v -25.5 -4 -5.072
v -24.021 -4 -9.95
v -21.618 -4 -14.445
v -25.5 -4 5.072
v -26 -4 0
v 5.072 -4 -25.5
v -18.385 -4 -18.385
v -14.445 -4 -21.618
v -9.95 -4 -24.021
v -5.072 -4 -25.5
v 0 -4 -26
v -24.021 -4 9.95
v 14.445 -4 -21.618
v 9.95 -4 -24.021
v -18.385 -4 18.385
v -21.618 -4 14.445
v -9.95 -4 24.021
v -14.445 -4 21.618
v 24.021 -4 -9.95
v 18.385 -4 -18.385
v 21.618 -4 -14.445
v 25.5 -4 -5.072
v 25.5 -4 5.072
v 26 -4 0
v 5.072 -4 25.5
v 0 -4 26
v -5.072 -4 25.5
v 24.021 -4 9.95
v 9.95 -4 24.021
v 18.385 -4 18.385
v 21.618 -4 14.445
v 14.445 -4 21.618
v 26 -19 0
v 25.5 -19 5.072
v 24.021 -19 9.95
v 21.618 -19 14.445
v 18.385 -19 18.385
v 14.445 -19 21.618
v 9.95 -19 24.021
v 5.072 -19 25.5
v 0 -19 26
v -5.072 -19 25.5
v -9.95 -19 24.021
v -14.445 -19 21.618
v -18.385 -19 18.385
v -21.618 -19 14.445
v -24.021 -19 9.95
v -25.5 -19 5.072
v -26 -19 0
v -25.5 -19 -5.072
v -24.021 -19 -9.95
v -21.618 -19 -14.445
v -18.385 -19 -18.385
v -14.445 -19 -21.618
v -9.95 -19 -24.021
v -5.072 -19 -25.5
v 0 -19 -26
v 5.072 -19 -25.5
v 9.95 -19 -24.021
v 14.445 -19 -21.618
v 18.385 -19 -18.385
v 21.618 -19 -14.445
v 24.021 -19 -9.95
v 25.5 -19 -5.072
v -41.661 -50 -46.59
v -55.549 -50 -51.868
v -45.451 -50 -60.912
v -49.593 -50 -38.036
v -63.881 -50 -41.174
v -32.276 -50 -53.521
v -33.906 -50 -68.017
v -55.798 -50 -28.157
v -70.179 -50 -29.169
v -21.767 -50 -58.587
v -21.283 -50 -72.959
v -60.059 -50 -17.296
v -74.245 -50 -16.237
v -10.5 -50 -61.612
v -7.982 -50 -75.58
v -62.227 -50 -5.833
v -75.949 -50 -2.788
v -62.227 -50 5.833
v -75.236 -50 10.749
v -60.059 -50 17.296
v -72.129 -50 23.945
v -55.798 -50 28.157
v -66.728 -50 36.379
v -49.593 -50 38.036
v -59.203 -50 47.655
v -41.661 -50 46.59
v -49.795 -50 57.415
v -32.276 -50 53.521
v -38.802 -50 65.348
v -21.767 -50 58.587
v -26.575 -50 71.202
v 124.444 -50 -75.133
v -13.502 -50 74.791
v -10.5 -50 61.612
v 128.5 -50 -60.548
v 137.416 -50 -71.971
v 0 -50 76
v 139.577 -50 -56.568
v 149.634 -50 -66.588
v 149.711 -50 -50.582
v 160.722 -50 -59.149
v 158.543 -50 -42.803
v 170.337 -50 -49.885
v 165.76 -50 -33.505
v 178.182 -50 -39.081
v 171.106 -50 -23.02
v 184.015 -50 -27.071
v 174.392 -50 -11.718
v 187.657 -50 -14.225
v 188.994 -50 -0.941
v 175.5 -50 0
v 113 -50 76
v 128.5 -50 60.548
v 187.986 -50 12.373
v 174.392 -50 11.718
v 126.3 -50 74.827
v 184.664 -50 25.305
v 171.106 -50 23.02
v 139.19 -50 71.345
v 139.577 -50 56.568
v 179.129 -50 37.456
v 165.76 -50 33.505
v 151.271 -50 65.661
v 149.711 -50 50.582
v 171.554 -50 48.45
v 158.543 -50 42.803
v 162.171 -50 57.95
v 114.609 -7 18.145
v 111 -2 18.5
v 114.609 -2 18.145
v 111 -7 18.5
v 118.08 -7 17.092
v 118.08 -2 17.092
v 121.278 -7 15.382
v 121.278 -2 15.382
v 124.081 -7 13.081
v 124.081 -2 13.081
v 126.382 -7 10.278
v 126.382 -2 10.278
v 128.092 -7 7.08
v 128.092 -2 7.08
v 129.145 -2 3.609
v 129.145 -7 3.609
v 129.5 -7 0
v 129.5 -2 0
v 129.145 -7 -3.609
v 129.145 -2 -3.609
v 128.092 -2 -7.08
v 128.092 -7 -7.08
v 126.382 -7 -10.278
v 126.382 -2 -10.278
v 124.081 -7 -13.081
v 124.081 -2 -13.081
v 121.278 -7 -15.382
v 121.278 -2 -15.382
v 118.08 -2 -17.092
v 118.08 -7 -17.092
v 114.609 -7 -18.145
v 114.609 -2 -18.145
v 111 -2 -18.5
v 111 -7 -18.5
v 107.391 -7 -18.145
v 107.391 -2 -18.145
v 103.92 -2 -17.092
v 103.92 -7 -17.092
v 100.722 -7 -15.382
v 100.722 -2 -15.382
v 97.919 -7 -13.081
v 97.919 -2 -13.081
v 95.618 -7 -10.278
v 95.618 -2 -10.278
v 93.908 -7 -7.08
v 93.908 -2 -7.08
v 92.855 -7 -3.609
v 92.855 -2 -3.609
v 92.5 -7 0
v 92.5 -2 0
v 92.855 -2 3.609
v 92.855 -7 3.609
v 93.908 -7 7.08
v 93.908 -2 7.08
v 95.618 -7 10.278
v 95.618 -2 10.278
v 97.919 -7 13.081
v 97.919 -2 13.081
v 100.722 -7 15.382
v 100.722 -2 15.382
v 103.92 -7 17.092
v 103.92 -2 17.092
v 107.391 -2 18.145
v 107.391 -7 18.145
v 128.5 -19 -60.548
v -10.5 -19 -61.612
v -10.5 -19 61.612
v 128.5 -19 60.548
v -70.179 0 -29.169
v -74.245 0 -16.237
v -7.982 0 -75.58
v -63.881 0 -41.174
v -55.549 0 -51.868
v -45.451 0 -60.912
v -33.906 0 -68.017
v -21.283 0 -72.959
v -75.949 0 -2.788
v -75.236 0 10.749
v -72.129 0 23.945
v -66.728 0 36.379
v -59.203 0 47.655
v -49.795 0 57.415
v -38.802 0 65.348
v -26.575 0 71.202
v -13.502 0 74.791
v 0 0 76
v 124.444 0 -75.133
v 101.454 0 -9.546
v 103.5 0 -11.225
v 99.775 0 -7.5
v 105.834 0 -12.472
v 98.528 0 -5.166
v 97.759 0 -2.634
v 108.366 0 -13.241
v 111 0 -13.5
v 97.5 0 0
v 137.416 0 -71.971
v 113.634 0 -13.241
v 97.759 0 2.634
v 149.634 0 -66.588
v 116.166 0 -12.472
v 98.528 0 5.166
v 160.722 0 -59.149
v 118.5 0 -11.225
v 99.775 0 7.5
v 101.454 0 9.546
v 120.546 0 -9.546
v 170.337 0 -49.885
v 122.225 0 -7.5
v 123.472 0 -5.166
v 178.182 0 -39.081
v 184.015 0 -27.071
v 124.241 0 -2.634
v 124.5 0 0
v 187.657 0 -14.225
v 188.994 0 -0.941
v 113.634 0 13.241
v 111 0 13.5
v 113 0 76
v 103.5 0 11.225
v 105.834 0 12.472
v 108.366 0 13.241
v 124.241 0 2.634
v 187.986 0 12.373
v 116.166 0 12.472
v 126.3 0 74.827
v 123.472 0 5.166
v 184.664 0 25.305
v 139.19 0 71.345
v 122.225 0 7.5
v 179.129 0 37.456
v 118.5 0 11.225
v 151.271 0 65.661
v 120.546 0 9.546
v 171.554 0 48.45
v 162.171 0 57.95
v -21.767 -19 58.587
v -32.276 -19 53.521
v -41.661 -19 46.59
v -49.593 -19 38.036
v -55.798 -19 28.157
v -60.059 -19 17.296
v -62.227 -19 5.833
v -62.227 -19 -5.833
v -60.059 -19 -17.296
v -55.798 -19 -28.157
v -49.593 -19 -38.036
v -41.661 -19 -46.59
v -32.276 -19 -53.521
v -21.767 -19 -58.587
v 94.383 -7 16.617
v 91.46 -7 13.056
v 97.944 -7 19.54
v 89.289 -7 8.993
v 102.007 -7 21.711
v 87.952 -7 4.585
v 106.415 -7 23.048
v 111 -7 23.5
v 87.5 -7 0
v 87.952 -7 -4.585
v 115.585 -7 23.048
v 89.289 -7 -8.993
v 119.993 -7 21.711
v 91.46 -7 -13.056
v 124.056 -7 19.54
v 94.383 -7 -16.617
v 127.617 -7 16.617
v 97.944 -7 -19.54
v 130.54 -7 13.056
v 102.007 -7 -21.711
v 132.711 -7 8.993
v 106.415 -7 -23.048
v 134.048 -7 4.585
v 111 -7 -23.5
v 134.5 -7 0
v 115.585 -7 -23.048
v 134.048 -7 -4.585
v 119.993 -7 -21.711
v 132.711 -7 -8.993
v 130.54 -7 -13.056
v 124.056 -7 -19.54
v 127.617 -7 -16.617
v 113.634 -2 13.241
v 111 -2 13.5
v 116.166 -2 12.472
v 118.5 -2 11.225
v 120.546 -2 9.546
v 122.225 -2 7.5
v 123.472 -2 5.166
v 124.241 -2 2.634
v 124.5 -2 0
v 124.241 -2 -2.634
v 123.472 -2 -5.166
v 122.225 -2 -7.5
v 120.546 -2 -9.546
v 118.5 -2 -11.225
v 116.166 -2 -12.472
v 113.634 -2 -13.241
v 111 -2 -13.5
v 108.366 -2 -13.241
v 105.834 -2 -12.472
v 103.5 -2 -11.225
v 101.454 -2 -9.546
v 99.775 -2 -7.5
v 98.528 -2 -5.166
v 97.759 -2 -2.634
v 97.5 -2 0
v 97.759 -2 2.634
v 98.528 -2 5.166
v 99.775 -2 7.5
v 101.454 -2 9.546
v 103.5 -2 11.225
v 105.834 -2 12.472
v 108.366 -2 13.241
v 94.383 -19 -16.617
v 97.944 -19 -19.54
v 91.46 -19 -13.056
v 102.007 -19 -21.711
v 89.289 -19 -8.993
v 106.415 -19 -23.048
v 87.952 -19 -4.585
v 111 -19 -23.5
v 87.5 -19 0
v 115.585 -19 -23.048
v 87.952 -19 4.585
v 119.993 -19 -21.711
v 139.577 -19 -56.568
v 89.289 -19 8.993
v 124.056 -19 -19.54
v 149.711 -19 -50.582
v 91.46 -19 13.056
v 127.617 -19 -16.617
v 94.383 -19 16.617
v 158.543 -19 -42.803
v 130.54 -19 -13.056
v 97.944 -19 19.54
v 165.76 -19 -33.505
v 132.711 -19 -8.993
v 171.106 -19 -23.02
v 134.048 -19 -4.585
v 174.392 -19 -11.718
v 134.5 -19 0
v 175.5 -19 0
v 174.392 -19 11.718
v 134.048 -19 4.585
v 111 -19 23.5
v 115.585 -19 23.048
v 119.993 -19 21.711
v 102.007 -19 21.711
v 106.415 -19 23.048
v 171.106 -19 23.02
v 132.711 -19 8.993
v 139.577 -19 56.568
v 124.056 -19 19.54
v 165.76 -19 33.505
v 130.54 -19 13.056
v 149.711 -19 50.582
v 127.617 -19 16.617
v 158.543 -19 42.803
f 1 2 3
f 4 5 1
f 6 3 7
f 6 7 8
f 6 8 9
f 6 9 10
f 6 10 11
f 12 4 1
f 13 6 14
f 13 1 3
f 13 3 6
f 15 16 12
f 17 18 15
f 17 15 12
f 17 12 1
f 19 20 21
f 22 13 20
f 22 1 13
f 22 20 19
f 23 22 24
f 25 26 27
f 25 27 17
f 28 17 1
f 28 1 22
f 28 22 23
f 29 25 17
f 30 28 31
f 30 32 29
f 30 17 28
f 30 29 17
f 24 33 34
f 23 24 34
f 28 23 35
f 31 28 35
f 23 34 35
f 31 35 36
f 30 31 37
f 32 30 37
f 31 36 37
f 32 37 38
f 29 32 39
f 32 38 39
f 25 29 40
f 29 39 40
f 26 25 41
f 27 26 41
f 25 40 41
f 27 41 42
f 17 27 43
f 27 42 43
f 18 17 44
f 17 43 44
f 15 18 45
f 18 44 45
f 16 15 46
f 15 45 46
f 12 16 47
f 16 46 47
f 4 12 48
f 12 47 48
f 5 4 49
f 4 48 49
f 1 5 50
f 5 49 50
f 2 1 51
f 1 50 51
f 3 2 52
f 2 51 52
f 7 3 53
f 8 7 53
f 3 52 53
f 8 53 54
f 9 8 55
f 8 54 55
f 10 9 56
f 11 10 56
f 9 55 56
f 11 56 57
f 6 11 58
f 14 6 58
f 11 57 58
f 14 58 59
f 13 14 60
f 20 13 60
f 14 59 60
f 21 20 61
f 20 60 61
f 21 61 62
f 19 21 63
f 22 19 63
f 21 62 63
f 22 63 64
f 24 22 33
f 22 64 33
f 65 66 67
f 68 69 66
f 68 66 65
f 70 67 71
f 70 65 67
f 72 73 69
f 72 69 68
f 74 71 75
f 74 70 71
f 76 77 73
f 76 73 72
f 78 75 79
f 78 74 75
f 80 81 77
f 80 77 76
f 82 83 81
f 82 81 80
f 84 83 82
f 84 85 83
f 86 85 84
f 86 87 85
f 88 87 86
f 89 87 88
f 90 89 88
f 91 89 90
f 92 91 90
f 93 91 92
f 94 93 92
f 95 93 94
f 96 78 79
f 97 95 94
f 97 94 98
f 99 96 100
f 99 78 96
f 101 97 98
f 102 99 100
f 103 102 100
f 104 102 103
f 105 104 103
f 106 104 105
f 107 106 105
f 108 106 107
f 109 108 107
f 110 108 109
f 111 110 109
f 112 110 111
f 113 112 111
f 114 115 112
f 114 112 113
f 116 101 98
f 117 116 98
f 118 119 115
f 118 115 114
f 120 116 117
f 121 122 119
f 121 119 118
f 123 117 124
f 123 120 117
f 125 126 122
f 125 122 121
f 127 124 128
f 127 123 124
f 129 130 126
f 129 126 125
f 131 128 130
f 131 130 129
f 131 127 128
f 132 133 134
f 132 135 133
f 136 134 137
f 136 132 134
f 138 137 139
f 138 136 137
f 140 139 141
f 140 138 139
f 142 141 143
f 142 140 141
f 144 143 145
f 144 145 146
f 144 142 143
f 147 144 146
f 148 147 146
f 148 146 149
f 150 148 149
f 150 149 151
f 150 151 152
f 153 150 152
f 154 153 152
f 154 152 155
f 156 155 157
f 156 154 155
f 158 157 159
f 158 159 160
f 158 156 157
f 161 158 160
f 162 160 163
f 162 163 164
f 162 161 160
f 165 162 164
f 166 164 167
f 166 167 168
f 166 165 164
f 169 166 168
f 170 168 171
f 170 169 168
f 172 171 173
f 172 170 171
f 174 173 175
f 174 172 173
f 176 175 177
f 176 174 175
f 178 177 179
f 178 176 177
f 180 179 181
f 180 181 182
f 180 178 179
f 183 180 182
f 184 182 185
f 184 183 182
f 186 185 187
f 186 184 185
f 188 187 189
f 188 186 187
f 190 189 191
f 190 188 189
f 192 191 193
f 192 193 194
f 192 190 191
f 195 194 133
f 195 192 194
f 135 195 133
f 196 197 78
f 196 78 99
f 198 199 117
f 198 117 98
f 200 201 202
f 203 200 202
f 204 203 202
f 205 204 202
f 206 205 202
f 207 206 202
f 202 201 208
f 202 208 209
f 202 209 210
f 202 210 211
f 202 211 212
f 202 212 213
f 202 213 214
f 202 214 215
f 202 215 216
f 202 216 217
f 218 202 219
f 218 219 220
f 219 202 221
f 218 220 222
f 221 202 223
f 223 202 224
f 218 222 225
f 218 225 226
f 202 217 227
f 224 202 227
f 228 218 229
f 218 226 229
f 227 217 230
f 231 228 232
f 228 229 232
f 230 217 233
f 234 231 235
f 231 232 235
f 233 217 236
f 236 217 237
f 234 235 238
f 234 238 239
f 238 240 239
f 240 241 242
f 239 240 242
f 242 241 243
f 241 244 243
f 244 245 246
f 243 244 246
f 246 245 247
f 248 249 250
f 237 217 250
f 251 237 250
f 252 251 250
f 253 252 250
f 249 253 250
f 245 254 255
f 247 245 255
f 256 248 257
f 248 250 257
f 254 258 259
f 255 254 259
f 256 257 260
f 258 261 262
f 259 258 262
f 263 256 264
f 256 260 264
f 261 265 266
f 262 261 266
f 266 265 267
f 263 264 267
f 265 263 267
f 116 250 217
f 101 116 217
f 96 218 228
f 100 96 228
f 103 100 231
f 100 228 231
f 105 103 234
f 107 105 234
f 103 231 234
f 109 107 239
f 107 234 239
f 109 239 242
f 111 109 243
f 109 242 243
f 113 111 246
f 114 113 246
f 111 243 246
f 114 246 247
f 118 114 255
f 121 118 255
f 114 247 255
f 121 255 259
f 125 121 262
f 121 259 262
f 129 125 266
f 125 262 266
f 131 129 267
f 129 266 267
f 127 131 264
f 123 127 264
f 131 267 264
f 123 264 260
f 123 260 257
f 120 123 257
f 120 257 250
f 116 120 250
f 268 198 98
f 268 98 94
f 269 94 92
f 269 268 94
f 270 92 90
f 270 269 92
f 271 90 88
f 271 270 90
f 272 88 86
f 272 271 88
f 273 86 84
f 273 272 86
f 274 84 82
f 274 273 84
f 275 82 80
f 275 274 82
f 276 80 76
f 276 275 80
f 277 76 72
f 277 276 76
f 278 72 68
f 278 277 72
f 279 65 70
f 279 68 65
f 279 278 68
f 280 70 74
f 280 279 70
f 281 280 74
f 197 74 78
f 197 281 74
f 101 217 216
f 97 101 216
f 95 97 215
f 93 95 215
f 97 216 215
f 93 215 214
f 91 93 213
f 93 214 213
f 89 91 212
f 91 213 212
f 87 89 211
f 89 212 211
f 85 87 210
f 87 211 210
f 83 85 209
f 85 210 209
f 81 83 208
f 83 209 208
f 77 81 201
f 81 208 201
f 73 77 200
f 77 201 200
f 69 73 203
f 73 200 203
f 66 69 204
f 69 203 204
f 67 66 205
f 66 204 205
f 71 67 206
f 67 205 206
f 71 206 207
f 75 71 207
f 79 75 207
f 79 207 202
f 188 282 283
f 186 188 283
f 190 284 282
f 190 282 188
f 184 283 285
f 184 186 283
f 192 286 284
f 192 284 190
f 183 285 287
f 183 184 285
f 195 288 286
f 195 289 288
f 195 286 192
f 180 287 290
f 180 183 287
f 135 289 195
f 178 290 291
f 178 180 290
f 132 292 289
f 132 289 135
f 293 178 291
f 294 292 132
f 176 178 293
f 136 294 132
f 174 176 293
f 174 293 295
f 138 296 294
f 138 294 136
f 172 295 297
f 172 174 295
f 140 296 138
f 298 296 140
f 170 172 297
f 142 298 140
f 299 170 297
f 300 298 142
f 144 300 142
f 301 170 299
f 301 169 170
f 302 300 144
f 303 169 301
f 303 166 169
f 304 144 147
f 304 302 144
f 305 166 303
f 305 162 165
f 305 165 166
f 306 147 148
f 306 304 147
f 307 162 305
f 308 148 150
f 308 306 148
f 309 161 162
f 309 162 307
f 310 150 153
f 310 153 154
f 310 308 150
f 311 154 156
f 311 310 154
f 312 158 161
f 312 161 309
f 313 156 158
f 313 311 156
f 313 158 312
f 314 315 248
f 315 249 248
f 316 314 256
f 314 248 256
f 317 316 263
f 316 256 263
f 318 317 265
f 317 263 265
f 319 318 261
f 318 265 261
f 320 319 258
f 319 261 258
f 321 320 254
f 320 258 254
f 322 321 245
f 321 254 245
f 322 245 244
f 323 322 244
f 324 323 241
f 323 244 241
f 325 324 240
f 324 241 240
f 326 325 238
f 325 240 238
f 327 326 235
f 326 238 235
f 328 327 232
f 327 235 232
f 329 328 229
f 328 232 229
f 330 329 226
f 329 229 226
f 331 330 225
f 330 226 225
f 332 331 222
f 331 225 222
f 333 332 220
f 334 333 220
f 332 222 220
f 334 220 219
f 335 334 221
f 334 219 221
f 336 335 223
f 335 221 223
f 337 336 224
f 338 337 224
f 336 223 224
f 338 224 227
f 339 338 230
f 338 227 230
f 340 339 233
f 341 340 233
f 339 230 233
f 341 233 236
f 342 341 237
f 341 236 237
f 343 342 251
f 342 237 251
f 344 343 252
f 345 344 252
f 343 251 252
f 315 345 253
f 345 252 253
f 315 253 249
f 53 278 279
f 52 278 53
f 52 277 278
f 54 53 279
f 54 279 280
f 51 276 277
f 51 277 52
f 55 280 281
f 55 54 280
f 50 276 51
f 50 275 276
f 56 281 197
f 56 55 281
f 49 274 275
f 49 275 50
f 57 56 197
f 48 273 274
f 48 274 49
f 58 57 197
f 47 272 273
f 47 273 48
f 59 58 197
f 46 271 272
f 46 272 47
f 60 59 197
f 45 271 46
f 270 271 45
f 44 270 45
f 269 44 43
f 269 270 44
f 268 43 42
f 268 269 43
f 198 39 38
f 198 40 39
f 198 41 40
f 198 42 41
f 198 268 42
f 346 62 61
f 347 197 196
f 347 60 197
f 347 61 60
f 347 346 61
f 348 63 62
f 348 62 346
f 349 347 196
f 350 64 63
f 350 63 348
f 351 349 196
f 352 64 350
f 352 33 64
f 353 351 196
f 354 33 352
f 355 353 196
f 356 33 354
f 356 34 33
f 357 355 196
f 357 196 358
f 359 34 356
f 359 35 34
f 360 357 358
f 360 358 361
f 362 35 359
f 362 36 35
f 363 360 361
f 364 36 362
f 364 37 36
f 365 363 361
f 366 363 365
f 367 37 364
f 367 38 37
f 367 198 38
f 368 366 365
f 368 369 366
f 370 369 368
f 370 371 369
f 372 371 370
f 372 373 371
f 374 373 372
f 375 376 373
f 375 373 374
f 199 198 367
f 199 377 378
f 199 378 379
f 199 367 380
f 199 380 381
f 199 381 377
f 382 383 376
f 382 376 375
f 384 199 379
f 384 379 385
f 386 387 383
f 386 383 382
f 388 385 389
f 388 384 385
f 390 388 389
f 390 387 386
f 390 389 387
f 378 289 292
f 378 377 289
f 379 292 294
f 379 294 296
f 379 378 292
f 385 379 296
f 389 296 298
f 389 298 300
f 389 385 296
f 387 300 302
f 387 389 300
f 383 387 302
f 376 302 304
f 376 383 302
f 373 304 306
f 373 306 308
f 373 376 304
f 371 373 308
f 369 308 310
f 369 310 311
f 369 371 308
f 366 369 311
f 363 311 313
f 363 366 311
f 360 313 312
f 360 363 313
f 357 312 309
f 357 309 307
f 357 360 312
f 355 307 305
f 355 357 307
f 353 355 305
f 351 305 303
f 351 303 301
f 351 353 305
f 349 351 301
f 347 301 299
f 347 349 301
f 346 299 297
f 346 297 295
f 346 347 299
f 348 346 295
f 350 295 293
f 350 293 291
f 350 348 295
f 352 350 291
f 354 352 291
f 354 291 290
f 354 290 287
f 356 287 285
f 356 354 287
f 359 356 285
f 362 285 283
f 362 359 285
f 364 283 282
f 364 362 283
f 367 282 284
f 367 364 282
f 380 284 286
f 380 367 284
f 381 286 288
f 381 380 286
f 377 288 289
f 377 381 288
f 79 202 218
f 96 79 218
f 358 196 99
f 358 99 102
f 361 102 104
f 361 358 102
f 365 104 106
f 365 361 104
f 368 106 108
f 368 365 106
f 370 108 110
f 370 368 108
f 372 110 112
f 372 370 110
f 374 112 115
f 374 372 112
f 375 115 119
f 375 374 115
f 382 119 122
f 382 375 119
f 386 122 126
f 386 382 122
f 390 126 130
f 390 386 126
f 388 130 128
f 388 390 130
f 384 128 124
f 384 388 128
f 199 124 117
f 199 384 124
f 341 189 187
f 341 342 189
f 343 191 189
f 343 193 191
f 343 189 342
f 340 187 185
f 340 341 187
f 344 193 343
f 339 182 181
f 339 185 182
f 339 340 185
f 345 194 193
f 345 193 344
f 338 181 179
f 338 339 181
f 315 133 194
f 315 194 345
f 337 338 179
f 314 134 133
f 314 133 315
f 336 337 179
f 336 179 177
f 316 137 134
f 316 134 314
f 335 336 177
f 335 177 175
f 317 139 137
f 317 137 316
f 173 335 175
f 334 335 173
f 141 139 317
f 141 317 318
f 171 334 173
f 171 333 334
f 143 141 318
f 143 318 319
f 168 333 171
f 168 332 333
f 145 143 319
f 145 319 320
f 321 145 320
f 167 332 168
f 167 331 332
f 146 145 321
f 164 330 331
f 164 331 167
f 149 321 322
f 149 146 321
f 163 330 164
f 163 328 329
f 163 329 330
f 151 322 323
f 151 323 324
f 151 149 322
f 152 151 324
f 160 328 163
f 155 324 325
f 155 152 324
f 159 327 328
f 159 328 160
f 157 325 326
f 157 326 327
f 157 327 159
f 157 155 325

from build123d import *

# Parameters (mm, degrees)
F1_DEPTH = 50
F4_DEPTH = 47
F5_R     = 26
F6_DEPTH = 15
F8_W     = 2
F8_H     = 13.5


with BuildPart() as f1:
    # F0 (on Front) → F1 (new body)
    with BuildSketch(Plane.XZ):
        with BuildLine():
            ThreePointArc((56.5, 50.8306010195), (30.9263182623, 69.4230713721), (0, 76))
            ThreePointArc((0, 76), (-75.8948480637, 3.9965031459), (-7.9819473433, -75.5796832264))
            Line((-7.9819473433, -75.5796832264), (8.4910760519, -75.5241790917))
            ThreePointArc((8.4910760519, -75.5241790917), (34.7620941702, -67.5839981719), (56.5, -50.8306010195))
            ThreePointArc((56.5, -50.8306010195), (37, 0), (56.5, 50.8306010195))
        make_face()
        with BuildLine():
            Line((113, 76), (0, 76))
            ThreePointArc((0, 76), (30.9263182623, 69.4230713721), (56.5, 50.8306010195))
            ThreePointArc((56.5, 50.8306010195), (82.0736817377, 69.4230713721), (113, 76))
        make_face()
        with BuildLine():
            ThreePointArc((113, 76), (82.0736817377, 69.4230713721), (56.5, 50.8306010195))
            ThreePointArc((56.5, 50.8306010195), (76, 0), (56.5, -50.8306010195))
            ThreePointArc((56.5, -50.8306010195), (77.1458775127, -67.0110580477), (102.0628366951, -75.2088988009))
            Line((102.0628366951, -75.2088988009), (124.4437263036, -75.133488727))
            ThreePointArc((124.4437263036, -75.133488727), (188.7830625643, 5.7382426207), (113, 76))
        make_face()
        with BuildLine():
            ThreePointArc((56.5, -50.8306010195), (76, 0), (56.5, 50.8306010195))
            ThreePointArc((56.5, 50.8306010195), (37, 0), (56.5, -50.8306010195))
        make_face()
        with BuildLine():
            ThreePointArc((56.5, -50.8306010195), (34.7620941702, -67.5839981719), (8.4910760519, -75.5241790917))
            Line((8.4910760519, -75.5241790917), (102.0628366951, -75.2088988009))
            ThreePointArc((102.0628366951, -75.2088988009), (77.1458775127, -67.0110580477), (56.5, -50.8306010195))
        make_face()
    extrude(amount=F1_DEPTH)

    # F3 (on offset) → F4 (cut)
    with BuildSketch(Plane.XZ.offset(19)):
        with BuildLine():
            Line((-10.5, -61.611687203), (-10.5, 61.611687203))
            ThreePointArc((-10.5, 61.611687203), (-62.5, 0), (-10.5, -61.611687203))
        make_face()
        Polygon((128.5, 60.5475020129), (-10.5, 61.611687203), (-10.5, -61.611687203), (128.5, -60.5475020129), align=None)
        with BuildLine():
            ThreePointArc((128.5, -60.5475020129), (175.5, 0), (128.5, 60.5475020129))
            Line((128.5, 60.5475020129), (128.5, -60.5475020129))
        make_face()
    extrude(amount=F4_DEPTH, mode=Mode.SUBTRACT)

    # F5 (on offset) → F6 (cut)
    with BuildSketch(Plane.XZ.offset(19)):
        Circle(F5_R)
    extrude(amount=-F6_DEPTH, mode=Mode.SUBTRACT)

    # F8 (on offset) → F9 (revolve, cut)
    with BuildSketch(Plane.YZ.offset(111)):
        with Locations((-1, 6.75)):
            Rectangle(F8_W, F8_H)
        Polygon((-17, 0), (-2, 0), (-2, 13.5), (-2, 18.5), (-7, 18.5), (-7, 23.5), (-19, 23.5), (-19, 0), align=None)
    revolve(axis=Axis((111, -8.5, 0), (0, 1, 0)), mode=Mode.SUBTRACT)


solid = f1.part
